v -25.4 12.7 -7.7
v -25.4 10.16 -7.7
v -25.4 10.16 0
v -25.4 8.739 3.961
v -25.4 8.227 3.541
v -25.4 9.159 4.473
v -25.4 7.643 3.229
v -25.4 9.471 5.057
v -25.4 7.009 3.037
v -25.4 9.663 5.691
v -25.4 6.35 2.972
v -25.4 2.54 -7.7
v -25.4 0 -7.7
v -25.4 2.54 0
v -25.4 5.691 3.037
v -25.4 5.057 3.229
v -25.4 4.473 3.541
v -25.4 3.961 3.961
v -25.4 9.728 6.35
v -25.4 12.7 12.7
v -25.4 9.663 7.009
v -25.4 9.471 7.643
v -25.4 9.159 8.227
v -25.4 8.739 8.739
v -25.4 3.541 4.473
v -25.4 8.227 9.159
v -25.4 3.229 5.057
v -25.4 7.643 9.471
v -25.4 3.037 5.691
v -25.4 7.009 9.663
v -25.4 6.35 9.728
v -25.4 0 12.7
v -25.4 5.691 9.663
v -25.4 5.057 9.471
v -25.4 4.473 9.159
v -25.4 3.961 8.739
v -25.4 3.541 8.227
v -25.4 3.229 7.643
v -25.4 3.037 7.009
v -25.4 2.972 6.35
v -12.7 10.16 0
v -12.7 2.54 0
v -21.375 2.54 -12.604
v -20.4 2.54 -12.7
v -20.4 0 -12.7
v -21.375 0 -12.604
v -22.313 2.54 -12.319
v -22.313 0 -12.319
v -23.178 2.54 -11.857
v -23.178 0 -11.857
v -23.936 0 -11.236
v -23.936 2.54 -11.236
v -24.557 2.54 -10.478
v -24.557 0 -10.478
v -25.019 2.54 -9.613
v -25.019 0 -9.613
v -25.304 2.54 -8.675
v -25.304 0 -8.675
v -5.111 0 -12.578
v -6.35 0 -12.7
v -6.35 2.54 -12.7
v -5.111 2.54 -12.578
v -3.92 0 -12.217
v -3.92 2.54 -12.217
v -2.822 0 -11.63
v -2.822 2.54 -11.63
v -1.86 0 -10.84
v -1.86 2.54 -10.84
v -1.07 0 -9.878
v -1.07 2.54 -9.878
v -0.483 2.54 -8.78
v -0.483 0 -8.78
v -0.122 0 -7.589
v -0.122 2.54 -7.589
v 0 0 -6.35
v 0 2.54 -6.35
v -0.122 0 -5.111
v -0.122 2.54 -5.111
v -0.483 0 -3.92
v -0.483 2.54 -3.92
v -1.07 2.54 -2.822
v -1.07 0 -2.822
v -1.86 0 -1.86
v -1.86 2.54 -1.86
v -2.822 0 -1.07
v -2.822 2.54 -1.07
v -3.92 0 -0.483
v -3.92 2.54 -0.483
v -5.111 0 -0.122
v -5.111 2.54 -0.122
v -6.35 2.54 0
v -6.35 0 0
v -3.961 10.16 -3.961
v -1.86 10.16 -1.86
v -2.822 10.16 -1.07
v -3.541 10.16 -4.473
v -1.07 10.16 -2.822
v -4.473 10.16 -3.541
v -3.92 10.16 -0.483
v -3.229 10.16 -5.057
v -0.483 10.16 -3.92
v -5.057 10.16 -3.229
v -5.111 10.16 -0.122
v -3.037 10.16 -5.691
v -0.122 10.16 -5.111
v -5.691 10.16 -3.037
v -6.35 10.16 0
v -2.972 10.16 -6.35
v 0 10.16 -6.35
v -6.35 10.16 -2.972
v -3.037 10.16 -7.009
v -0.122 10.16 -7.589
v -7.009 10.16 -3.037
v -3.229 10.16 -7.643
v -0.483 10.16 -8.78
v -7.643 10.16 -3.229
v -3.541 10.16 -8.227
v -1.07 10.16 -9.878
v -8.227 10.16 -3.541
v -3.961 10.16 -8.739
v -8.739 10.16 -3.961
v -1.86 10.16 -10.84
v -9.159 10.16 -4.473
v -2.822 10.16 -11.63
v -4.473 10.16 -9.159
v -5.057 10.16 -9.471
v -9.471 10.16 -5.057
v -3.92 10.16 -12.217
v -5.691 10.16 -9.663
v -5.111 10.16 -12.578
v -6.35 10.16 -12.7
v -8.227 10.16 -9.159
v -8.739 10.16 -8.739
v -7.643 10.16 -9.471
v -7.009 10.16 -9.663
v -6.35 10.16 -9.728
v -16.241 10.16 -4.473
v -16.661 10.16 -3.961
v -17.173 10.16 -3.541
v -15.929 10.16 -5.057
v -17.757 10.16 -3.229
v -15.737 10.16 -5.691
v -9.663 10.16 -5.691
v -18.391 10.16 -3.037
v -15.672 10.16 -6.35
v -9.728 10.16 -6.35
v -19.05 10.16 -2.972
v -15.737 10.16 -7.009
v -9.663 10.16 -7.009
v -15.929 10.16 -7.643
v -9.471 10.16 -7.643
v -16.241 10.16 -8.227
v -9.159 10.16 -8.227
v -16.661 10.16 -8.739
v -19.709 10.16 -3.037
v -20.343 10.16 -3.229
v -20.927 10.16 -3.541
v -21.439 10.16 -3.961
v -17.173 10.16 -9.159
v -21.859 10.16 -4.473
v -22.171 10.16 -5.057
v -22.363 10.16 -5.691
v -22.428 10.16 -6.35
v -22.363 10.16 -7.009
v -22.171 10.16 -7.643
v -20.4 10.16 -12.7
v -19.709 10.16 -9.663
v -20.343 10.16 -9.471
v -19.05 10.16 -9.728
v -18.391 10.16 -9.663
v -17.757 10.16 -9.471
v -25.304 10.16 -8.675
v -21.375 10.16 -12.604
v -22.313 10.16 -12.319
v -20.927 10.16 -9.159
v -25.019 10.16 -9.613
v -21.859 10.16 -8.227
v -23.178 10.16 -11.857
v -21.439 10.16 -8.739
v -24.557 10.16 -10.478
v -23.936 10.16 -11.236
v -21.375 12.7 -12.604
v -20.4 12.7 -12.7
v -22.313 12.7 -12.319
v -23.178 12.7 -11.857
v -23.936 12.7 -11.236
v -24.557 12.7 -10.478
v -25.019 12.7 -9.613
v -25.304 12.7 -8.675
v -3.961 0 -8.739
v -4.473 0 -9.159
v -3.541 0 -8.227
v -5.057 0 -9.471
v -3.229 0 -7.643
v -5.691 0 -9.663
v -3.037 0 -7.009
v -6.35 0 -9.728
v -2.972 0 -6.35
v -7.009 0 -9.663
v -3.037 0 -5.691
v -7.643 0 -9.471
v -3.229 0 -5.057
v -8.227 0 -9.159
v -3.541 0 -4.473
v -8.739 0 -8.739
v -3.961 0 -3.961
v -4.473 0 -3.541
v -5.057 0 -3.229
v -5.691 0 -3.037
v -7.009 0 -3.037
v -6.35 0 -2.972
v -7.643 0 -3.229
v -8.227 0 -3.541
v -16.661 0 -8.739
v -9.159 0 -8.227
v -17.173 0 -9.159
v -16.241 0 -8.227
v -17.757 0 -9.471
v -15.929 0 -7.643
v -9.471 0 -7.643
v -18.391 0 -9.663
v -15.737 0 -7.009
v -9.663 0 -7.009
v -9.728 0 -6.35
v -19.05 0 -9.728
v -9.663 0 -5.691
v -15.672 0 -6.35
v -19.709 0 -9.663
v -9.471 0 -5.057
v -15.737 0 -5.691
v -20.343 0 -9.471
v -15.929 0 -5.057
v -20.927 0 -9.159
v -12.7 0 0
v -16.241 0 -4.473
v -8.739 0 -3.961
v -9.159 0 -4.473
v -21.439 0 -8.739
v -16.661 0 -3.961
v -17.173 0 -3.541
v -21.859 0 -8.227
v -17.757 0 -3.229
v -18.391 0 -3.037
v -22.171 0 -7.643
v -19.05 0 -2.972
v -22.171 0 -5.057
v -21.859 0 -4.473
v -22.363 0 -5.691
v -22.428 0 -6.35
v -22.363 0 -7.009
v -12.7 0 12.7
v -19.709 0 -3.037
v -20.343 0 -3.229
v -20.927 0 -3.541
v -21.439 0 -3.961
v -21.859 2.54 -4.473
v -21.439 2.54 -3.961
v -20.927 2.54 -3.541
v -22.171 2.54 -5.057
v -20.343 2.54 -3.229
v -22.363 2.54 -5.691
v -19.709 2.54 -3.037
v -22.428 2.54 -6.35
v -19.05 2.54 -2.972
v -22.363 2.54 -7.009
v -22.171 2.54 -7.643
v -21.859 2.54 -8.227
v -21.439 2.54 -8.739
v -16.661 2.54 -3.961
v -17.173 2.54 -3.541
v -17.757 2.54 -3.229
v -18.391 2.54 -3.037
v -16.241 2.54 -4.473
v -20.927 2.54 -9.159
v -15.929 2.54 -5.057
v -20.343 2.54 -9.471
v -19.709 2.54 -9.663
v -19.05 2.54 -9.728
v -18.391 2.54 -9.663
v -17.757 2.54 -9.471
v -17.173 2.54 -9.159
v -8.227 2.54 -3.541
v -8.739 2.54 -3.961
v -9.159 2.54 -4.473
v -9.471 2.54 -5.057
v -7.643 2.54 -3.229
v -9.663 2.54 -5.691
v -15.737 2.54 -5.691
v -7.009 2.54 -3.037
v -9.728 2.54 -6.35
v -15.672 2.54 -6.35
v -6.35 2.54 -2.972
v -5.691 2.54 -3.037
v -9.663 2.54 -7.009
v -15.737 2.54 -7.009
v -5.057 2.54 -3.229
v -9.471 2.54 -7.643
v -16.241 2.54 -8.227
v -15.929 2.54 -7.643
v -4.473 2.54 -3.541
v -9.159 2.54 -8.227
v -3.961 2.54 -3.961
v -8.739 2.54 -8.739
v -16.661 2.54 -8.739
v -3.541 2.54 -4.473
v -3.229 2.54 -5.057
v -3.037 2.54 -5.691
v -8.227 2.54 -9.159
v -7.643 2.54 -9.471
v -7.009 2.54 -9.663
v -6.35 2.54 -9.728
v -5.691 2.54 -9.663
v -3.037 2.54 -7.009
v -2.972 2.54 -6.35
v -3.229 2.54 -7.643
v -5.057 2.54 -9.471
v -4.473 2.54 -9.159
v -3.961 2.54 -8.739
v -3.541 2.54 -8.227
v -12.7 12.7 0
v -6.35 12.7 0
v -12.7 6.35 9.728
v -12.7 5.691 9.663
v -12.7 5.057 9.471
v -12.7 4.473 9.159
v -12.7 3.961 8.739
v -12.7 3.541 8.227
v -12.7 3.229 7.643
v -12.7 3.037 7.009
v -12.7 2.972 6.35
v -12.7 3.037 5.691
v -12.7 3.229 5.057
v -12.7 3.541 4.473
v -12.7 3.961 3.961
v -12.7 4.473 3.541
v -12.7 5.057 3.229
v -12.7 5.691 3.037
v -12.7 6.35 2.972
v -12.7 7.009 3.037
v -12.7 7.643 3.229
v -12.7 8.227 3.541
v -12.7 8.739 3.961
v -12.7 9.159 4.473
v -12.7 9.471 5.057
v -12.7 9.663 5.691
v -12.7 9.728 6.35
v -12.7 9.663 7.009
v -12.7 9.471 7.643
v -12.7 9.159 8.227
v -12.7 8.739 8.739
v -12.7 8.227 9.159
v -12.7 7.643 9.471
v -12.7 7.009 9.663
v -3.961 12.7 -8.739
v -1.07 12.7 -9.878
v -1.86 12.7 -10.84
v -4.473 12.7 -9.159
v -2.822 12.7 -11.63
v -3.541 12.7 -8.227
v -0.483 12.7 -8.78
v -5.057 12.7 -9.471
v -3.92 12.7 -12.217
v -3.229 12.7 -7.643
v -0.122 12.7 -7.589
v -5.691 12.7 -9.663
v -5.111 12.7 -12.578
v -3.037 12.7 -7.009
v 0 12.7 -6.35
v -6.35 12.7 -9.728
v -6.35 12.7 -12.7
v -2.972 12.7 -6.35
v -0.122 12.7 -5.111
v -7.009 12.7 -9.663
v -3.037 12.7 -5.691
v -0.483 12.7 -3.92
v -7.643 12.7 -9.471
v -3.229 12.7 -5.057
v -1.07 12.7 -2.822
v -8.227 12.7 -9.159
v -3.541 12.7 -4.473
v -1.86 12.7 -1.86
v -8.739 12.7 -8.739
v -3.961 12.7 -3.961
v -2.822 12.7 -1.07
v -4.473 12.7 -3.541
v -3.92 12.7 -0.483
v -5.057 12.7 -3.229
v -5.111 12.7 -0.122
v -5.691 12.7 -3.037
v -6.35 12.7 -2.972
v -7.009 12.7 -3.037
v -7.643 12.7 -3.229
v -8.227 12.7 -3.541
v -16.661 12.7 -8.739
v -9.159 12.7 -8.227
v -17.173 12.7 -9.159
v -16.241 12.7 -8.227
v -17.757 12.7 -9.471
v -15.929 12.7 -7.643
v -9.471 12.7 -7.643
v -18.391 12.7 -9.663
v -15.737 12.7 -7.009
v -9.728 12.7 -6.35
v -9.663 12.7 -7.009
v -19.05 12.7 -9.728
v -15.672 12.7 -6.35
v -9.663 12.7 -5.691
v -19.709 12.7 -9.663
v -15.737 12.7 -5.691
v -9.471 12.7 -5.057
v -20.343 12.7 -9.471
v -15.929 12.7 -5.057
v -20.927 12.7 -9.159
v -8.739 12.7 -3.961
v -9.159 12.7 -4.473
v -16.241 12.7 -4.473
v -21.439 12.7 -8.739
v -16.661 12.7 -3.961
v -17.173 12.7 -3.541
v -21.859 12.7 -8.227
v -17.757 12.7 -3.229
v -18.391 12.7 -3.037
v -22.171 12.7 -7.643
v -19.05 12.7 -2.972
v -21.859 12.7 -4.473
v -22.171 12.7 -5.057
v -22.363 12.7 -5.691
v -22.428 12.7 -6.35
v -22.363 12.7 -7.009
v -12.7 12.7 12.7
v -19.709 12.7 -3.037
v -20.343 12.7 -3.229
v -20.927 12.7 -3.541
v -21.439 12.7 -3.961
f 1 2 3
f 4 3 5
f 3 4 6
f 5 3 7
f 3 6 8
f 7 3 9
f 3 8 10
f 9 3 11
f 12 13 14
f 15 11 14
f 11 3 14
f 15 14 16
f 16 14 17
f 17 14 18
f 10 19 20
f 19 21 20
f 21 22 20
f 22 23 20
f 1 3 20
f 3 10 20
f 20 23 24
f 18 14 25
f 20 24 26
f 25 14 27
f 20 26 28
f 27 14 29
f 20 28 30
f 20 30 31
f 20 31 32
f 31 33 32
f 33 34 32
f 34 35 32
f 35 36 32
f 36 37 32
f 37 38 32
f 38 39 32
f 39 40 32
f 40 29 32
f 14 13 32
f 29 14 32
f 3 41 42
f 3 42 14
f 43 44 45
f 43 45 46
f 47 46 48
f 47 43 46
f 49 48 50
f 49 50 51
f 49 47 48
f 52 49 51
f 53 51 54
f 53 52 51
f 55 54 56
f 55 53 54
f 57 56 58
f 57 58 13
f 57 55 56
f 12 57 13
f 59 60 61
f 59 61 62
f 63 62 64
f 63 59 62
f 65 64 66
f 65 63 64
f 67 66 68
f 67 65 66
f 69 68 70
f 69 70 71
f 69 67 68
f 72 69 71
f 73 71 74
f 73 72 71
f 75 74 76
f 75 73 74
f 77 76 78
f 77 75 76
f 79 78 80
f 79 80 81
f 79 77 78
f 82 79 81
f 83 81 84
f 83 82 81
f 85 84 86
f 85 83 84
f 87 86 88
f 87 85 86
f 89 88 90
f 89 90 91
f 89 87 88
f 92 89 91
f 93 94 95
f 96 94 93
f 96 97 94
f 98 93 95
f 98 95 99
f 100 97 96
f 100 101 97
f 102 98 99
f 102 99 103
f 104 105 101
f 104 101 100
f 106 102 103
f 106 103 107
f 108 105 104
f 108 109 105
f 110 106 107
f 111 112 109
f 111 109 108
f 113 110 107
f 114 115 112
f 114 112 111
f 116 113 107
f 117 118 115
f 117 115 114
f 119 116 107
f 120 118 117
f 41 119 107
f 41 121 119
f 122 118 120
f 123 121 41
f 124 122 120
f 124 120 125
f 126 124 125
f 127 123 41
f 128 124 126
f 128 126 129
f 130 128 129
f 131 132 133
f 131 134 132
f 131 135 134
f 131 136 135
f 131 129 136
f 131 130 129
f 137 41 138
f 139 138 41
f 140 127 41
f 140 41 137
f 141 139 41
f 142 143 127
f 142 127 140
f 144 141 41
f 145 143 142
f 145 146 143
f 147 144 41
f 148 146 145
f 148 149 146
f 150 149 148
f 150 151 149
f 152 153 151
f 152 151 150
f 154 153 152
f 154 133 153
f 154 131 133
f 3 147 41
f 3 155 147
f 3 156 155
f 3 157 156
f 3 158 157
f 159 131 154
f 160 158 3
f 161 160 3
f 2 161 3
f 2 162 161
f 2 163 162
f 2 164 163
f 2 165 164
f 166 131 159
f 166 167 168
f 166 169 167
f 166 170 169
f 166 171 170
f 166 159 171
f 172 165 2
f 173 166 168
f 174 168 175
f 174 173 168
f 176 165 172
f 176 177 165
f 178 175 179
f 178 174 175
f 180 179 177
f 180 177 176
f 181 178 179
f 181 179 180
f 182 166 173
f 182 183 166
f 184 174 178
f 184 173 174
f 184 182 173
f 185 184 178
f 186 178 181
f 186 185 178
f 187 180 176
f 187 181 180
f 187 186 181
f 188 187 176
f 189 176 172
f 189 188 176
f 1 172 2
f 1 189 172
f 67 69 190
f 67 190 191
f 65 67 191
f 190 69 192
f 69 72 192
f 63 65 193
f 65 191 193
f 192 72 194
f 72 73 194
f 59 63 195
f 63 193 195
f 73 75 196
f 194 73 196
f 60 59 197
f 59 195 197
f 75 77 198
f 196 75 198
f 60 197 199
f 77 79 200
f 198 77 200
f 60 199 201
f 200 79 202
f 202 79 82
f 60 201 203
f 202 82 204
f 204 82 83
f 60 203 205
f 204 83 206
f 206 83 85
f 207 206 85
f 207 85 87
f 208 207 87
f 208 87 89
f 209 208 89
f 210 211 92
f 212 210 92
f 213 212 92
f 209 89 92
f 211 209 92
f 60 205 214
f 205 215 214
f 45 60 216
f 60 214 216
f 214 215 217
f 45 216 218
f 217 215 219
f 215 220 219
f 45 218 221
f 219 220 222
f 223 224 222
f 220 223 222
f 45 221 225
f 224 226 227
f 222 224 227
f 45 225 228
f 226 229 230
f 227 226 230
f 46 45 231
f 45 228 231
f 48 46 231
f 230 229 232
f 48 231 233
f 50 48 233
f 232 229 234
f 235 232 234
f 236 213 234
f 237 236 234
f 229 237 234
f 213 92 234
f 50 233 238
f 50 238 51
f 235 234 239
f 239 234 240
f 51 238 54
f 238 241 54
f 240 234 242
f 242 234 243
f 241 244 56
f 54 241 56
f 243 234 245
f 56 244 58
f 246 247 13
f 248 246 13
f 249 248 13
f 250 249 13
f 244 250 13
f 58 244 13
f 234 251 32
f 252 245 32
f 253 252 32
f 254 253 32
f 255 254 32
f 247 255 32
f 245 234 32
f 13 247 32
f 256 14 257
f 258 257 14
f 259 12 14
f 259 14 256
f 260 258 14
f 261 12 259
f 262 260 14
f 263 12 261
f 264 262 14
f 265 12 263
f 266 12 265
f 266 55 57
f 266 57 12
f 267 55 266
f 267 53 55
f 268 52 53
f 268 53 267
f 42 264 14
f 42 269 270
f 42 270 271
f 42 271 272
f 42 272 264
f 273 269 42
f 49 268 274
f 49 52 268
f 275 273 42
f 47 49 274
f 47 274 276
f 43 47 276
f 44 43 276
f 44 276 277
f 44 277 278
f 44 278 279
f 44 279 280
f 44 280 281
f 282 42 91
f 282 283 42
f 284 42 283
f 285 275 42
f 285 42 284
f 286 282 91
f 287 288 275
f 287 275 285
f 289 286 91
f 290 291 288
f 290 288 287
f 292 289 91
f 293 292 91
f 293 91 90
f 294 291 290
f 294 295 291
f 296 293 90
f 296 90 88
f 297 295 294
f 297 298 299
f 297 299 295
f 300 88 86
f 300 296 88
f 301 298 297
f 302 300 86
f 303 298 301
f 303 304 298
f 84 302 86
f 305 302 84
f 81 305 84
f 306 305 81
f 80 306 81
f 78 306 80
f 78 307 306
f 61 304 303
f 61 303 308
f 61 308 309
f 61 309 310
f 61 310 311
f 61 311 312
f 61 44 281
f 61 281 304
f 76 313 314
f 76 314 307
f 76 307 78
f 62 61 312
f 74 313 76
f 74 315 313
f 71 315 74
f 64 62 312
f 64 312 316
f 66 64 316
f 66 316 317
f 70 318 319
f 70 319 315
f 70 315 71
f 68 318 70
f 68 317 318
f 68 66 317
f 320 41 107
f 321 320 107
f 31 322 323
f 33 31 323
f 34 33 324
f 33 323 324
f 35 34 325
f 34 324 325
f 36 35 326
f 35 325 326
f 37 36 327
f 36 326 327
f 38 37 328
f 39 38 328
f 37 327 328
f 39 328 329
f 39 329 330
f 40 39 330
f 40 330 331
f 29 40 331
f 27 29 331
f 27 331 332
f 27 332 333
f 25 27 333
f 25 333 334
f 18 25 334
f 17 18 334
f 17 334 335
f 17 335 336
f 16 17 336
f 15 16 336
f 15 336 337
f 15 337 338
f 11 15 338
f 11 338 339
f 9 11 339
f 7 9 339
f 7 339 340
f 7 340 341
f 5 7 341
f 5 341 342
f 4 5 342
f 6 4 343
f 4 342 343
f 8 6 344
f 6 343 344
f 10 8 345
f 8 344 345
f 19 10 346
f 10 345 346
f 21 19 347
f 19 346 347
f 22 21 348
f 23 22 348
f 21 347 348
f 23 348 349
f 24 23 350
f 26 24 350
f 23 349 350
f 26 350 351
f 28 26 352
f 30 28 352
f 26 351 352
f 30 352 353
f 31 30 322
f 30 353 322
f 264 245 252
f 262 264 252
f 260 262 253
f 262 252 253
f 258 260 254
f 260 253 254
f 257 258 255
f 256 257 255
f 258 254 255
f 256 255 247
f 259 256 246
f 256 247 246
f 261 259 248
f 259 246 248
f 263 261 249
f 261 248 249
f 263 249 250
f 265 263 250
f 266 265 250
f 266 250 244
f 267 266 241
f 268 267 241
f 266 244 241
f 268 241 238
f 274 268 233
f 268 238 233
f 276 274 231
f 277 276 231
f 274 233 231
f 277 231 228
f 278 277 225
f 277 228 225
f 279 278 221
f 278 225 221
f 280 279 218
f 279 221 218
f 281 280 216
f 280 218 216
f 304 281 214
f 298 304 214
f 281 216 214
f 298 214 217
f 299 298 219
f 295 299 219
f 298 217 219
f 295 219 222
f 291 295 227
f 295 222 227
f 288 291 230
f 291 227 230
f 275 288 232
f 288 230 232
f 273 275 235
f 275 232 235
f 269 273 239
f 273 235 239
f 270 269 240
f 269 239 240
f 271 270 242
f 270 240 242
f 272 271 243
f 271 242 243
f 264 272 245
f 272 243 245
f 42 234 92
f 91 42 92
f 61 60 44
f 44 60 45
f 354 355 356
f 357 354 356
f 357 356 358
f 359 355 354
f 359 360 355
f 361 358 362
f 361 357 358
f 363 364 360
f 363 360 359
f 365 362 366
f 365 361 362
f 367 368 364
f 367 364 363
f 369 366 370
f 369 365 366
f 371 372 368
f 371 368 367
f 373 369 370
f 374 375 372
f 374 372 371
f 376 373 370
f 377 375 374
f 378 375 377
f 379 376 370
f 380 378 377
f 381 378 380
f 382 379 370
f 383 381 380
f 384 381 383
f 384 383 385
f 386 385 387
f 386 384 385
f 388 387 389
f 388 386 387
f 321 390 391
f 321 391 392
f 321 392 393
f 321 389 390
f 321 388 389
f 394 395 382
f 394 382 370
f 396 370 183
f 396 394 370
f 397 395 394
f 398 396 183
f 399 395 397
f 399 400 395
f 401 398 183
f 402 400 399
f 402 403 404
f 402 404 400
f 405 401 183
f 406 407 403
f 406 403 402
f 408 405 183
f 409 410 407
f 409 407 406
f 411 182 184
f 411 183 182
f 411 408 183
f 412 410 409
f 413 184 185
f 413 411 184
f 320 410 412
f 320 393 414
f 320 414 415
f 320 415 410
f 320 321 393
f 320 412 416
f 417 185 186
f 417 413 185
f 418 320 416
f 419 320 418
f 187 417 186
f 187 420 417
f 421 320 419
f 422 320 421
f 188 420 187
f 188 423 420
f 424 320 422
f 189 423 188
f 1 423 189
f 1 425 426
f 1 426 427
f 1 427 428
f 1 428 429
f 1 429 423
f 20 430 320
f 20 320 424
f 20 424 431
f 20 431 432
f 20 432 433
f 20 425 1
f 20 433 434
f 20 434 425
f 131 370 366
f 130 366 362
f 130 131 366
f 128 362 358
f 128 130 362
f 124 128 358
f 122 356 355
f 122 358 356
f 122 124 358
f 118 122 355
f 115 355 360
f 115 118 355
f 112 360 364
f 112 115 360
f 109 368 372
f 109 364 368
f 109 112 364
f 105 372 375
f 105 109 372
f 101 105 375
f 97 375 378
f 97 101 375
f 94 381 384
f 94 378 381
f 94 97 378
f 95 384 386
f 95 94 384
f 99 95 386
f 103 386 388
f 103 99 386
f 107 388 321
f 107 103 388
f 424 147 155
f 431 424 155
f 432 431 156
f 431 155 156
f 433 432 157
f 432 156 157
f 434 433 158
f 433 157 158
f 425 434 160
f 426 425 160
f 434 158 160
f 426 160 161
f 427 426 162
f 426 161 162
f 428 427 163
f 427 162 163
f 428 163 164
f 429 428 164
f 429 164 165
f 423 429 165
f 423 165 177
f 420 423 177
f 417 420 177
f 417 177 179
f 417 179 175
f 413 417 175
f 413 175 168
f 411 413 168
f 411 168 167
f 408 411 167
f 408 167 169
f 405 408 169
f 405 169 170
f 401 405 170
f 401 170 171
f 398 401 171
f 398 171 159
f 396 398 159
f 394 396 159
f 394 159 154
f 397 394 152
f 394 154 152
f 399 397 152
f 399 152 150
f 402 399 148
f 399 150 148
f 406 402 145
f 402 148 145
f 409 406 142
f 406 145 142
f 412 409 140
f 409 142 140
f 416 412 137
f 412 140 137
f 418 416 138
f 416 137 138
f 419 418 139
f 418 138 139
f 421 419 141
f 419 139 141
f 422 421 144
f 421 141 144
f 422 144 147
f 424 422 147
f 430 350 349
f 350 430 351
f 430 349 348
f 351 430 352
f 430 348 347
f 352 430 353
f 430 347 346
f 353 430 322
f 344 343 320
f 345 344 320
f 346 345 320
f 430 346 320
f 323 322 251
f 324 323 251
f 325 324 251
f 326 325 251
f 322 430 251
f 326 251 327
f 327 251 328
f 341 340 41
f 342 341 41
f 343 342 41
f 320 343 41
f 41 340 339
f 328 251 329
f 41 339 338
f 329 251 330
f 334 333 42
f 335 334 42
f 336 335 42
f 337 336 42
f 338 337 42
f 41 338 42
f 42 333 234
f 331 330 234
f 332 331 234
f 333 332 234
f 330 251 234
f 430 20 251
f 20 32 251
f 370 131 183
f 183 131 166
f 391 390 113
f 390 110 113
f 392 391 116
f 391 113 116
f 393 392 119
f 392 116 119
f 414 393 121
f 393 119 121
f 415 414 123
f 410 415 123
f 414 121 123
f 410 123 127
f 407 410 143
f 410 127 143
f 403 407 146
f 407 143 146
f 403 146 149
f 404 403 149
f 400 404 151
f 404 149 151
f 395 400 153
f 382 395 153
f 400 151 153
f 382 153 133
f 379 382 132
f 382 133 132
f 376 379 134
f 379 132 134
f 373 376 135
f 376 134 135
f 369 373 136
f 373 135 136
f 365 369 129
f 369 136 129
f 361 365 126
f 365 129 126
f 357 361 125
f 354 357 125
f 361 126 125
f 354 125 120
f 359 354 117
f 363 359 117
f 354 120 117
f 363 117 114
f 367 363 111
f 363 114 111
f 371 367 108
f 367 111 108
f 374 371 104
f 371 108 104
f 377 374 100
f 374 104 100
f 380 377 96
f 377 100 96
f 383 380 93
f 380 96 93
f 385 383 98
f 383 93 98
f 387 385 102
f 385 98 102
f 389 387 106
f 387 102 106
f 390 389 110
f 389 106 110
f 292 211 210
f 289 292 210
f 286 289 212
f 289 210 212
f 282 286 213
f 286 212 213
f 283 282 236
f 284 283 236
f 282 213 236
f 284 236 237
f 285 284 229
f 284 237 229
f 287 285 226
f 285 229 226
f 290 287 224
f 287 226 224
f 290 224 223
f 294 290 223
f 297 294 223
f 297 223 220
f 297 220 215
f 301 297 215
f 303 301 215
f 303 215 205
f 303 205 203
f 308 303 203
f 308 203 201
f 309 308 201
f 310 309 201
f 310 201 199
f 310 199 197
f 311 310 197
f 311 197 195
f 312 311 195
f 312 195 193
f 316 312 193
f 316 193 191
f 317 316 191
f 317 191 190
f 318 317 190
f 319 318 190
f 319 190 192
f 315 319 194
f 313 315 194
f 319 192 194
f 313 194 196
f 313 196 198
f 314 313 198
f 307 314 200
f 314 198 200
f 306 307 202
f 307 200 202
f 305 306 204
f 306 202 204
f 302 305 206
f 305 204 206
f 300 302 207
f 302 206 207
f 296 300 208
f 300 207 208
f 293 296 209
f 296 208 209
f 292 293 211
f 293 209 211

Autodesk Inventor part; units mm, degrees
ref_plane "YZ Plane" through (0, 0, 0) normal (1, 0, 0) x (0, 1, 0)
ref_plane "XZ Plane" through (0, 0, 0) normal (0, 1, 0) x (-1, 0, 0)
ref_plane "XY Plane" through (0, 0, 0) normal (0, 0, 1) x (1, 0, 0)
sketch "Sketch1" plane through (0, 0, 0) normal (0, 1, 0) x (-1, 0, 0)
  line L0 (0, 0) -> (0, -12.7)
  line L1 (0, -12.7) -> (25.4, -12.7)
  line L2 (25.4, -12.7) -> (25.4, 12.7)
  line L3 (25.4, 12.7) -> (12.7, 12.7)
  line L4 (12.7, 12.7) -> (12.7, 0)
  line L5 (12.7, 0) -> (0, 0)
  arc A0 (6.35, 0) -> (6.35, -12.7) centre (6.35, -6.35) ccw
  dimension "d0" = 12.7
  dimension "d1" = 25.4
  dimension "d2" = 25.4
  dimension "d3" = 12.7
extrude "Extrusion1" add sketch "Sketch1" along normal blind 12.7 contours A0 L5 L4 L3 L2 L1
sketch "Sketch2" plane through (-25.4, 0, -12.7) normal (-1, 0, 0) x (0, 0, 1)
  line L0 (25.4, 0) -> (25.4, 12.7) projected
  point P0 (12.7, 0)
  point P1 (19.05, 6.35)
  point P2 (25.4, 6.35)
  dimension "d6" = 6.35
sketch "Sketch3" plane through (0, 0, -12.7) normal (0, 0, -1) x (-1, 0, 0)
  line L0 (0, 0) -> (0, 12.7) projected
  line L1 (12.7, 0) -> (12.7, 12.7) projected
  line L2 (0, 10.16) -> (12.7, 10.16)
  line L3 (12.7, 10.16) -> (12.7, 2.54)
  line L4 (12.7, 2.54) -> (0, 2.54)
  line L5 (0, 2.54) -> (0, 10.16)
  line L6 (25.4, 0) -> (25.4, 12.7) projected
  line L7 (12.7, 2.54) -> (25.4, 2.54)
  line L8 (25.4, 2.54) -> (25.4, 10.16)
  line L9 (25.4, 10.16) -> (12.7, 10.16)
  line L10 (12.7, 10.16) -> (12.7, 2.54)
  point P0 (12.7, 6.35)
  point P1 (0, 2.54)
  dimension "d15" = 7.62
extrude "Extrusion2" cut sketch "Sketch3" against normal blind 12.7
sketch "Sketch4" plane through (0, 12.7, 0) normal (0, 1, 0) x (1, 0, 0)
  line L0 (0, 0) -> (0, 12.7) projected
  line L1 (-12.7, 0) -> (0, 0) projected
  line L2 (-12.7, -12.7) -> (-12.7, 0) projected
  line L3 (-12.7, 0) -> (-12.7, 12.7)
  point P0 (-6.35, 6.35)
  point P1 (0, 6.35)
  point P2 (-6.35, 0)
  point P3 (-19.05, 6.35)
hole "Hole2" at (-6.35, 12.7, -6.35) at (-19.05, 12.7, -6.35) direction (0, -1, 0) diameter 6.7564 depth 12.7 tip angle 118 clearance for "Flat Head Machine Screw (82)" size "1/4" standard "Ansi Unified Screw Threads"
hole "Hole3" at (-25.4, 6.35, 6.35) direction (1, 0, 0) diameter 6.7564 depth 12.7 tip angle 118 clearance for "Flat Head Machine Screw (82)" size "1/4" standard "Ansi Unified Screw Threads"
ref_plane "Work Plane1" through (-6.35, 12.7, 0) normal (1, 0, 0) x (0, 0, -1)
fillet "Fillet1" radius 5 2 edges at (-25.4, 11.43, -12.7) (-25.4, 1.27, -12.7)
properties part number "Locker"
